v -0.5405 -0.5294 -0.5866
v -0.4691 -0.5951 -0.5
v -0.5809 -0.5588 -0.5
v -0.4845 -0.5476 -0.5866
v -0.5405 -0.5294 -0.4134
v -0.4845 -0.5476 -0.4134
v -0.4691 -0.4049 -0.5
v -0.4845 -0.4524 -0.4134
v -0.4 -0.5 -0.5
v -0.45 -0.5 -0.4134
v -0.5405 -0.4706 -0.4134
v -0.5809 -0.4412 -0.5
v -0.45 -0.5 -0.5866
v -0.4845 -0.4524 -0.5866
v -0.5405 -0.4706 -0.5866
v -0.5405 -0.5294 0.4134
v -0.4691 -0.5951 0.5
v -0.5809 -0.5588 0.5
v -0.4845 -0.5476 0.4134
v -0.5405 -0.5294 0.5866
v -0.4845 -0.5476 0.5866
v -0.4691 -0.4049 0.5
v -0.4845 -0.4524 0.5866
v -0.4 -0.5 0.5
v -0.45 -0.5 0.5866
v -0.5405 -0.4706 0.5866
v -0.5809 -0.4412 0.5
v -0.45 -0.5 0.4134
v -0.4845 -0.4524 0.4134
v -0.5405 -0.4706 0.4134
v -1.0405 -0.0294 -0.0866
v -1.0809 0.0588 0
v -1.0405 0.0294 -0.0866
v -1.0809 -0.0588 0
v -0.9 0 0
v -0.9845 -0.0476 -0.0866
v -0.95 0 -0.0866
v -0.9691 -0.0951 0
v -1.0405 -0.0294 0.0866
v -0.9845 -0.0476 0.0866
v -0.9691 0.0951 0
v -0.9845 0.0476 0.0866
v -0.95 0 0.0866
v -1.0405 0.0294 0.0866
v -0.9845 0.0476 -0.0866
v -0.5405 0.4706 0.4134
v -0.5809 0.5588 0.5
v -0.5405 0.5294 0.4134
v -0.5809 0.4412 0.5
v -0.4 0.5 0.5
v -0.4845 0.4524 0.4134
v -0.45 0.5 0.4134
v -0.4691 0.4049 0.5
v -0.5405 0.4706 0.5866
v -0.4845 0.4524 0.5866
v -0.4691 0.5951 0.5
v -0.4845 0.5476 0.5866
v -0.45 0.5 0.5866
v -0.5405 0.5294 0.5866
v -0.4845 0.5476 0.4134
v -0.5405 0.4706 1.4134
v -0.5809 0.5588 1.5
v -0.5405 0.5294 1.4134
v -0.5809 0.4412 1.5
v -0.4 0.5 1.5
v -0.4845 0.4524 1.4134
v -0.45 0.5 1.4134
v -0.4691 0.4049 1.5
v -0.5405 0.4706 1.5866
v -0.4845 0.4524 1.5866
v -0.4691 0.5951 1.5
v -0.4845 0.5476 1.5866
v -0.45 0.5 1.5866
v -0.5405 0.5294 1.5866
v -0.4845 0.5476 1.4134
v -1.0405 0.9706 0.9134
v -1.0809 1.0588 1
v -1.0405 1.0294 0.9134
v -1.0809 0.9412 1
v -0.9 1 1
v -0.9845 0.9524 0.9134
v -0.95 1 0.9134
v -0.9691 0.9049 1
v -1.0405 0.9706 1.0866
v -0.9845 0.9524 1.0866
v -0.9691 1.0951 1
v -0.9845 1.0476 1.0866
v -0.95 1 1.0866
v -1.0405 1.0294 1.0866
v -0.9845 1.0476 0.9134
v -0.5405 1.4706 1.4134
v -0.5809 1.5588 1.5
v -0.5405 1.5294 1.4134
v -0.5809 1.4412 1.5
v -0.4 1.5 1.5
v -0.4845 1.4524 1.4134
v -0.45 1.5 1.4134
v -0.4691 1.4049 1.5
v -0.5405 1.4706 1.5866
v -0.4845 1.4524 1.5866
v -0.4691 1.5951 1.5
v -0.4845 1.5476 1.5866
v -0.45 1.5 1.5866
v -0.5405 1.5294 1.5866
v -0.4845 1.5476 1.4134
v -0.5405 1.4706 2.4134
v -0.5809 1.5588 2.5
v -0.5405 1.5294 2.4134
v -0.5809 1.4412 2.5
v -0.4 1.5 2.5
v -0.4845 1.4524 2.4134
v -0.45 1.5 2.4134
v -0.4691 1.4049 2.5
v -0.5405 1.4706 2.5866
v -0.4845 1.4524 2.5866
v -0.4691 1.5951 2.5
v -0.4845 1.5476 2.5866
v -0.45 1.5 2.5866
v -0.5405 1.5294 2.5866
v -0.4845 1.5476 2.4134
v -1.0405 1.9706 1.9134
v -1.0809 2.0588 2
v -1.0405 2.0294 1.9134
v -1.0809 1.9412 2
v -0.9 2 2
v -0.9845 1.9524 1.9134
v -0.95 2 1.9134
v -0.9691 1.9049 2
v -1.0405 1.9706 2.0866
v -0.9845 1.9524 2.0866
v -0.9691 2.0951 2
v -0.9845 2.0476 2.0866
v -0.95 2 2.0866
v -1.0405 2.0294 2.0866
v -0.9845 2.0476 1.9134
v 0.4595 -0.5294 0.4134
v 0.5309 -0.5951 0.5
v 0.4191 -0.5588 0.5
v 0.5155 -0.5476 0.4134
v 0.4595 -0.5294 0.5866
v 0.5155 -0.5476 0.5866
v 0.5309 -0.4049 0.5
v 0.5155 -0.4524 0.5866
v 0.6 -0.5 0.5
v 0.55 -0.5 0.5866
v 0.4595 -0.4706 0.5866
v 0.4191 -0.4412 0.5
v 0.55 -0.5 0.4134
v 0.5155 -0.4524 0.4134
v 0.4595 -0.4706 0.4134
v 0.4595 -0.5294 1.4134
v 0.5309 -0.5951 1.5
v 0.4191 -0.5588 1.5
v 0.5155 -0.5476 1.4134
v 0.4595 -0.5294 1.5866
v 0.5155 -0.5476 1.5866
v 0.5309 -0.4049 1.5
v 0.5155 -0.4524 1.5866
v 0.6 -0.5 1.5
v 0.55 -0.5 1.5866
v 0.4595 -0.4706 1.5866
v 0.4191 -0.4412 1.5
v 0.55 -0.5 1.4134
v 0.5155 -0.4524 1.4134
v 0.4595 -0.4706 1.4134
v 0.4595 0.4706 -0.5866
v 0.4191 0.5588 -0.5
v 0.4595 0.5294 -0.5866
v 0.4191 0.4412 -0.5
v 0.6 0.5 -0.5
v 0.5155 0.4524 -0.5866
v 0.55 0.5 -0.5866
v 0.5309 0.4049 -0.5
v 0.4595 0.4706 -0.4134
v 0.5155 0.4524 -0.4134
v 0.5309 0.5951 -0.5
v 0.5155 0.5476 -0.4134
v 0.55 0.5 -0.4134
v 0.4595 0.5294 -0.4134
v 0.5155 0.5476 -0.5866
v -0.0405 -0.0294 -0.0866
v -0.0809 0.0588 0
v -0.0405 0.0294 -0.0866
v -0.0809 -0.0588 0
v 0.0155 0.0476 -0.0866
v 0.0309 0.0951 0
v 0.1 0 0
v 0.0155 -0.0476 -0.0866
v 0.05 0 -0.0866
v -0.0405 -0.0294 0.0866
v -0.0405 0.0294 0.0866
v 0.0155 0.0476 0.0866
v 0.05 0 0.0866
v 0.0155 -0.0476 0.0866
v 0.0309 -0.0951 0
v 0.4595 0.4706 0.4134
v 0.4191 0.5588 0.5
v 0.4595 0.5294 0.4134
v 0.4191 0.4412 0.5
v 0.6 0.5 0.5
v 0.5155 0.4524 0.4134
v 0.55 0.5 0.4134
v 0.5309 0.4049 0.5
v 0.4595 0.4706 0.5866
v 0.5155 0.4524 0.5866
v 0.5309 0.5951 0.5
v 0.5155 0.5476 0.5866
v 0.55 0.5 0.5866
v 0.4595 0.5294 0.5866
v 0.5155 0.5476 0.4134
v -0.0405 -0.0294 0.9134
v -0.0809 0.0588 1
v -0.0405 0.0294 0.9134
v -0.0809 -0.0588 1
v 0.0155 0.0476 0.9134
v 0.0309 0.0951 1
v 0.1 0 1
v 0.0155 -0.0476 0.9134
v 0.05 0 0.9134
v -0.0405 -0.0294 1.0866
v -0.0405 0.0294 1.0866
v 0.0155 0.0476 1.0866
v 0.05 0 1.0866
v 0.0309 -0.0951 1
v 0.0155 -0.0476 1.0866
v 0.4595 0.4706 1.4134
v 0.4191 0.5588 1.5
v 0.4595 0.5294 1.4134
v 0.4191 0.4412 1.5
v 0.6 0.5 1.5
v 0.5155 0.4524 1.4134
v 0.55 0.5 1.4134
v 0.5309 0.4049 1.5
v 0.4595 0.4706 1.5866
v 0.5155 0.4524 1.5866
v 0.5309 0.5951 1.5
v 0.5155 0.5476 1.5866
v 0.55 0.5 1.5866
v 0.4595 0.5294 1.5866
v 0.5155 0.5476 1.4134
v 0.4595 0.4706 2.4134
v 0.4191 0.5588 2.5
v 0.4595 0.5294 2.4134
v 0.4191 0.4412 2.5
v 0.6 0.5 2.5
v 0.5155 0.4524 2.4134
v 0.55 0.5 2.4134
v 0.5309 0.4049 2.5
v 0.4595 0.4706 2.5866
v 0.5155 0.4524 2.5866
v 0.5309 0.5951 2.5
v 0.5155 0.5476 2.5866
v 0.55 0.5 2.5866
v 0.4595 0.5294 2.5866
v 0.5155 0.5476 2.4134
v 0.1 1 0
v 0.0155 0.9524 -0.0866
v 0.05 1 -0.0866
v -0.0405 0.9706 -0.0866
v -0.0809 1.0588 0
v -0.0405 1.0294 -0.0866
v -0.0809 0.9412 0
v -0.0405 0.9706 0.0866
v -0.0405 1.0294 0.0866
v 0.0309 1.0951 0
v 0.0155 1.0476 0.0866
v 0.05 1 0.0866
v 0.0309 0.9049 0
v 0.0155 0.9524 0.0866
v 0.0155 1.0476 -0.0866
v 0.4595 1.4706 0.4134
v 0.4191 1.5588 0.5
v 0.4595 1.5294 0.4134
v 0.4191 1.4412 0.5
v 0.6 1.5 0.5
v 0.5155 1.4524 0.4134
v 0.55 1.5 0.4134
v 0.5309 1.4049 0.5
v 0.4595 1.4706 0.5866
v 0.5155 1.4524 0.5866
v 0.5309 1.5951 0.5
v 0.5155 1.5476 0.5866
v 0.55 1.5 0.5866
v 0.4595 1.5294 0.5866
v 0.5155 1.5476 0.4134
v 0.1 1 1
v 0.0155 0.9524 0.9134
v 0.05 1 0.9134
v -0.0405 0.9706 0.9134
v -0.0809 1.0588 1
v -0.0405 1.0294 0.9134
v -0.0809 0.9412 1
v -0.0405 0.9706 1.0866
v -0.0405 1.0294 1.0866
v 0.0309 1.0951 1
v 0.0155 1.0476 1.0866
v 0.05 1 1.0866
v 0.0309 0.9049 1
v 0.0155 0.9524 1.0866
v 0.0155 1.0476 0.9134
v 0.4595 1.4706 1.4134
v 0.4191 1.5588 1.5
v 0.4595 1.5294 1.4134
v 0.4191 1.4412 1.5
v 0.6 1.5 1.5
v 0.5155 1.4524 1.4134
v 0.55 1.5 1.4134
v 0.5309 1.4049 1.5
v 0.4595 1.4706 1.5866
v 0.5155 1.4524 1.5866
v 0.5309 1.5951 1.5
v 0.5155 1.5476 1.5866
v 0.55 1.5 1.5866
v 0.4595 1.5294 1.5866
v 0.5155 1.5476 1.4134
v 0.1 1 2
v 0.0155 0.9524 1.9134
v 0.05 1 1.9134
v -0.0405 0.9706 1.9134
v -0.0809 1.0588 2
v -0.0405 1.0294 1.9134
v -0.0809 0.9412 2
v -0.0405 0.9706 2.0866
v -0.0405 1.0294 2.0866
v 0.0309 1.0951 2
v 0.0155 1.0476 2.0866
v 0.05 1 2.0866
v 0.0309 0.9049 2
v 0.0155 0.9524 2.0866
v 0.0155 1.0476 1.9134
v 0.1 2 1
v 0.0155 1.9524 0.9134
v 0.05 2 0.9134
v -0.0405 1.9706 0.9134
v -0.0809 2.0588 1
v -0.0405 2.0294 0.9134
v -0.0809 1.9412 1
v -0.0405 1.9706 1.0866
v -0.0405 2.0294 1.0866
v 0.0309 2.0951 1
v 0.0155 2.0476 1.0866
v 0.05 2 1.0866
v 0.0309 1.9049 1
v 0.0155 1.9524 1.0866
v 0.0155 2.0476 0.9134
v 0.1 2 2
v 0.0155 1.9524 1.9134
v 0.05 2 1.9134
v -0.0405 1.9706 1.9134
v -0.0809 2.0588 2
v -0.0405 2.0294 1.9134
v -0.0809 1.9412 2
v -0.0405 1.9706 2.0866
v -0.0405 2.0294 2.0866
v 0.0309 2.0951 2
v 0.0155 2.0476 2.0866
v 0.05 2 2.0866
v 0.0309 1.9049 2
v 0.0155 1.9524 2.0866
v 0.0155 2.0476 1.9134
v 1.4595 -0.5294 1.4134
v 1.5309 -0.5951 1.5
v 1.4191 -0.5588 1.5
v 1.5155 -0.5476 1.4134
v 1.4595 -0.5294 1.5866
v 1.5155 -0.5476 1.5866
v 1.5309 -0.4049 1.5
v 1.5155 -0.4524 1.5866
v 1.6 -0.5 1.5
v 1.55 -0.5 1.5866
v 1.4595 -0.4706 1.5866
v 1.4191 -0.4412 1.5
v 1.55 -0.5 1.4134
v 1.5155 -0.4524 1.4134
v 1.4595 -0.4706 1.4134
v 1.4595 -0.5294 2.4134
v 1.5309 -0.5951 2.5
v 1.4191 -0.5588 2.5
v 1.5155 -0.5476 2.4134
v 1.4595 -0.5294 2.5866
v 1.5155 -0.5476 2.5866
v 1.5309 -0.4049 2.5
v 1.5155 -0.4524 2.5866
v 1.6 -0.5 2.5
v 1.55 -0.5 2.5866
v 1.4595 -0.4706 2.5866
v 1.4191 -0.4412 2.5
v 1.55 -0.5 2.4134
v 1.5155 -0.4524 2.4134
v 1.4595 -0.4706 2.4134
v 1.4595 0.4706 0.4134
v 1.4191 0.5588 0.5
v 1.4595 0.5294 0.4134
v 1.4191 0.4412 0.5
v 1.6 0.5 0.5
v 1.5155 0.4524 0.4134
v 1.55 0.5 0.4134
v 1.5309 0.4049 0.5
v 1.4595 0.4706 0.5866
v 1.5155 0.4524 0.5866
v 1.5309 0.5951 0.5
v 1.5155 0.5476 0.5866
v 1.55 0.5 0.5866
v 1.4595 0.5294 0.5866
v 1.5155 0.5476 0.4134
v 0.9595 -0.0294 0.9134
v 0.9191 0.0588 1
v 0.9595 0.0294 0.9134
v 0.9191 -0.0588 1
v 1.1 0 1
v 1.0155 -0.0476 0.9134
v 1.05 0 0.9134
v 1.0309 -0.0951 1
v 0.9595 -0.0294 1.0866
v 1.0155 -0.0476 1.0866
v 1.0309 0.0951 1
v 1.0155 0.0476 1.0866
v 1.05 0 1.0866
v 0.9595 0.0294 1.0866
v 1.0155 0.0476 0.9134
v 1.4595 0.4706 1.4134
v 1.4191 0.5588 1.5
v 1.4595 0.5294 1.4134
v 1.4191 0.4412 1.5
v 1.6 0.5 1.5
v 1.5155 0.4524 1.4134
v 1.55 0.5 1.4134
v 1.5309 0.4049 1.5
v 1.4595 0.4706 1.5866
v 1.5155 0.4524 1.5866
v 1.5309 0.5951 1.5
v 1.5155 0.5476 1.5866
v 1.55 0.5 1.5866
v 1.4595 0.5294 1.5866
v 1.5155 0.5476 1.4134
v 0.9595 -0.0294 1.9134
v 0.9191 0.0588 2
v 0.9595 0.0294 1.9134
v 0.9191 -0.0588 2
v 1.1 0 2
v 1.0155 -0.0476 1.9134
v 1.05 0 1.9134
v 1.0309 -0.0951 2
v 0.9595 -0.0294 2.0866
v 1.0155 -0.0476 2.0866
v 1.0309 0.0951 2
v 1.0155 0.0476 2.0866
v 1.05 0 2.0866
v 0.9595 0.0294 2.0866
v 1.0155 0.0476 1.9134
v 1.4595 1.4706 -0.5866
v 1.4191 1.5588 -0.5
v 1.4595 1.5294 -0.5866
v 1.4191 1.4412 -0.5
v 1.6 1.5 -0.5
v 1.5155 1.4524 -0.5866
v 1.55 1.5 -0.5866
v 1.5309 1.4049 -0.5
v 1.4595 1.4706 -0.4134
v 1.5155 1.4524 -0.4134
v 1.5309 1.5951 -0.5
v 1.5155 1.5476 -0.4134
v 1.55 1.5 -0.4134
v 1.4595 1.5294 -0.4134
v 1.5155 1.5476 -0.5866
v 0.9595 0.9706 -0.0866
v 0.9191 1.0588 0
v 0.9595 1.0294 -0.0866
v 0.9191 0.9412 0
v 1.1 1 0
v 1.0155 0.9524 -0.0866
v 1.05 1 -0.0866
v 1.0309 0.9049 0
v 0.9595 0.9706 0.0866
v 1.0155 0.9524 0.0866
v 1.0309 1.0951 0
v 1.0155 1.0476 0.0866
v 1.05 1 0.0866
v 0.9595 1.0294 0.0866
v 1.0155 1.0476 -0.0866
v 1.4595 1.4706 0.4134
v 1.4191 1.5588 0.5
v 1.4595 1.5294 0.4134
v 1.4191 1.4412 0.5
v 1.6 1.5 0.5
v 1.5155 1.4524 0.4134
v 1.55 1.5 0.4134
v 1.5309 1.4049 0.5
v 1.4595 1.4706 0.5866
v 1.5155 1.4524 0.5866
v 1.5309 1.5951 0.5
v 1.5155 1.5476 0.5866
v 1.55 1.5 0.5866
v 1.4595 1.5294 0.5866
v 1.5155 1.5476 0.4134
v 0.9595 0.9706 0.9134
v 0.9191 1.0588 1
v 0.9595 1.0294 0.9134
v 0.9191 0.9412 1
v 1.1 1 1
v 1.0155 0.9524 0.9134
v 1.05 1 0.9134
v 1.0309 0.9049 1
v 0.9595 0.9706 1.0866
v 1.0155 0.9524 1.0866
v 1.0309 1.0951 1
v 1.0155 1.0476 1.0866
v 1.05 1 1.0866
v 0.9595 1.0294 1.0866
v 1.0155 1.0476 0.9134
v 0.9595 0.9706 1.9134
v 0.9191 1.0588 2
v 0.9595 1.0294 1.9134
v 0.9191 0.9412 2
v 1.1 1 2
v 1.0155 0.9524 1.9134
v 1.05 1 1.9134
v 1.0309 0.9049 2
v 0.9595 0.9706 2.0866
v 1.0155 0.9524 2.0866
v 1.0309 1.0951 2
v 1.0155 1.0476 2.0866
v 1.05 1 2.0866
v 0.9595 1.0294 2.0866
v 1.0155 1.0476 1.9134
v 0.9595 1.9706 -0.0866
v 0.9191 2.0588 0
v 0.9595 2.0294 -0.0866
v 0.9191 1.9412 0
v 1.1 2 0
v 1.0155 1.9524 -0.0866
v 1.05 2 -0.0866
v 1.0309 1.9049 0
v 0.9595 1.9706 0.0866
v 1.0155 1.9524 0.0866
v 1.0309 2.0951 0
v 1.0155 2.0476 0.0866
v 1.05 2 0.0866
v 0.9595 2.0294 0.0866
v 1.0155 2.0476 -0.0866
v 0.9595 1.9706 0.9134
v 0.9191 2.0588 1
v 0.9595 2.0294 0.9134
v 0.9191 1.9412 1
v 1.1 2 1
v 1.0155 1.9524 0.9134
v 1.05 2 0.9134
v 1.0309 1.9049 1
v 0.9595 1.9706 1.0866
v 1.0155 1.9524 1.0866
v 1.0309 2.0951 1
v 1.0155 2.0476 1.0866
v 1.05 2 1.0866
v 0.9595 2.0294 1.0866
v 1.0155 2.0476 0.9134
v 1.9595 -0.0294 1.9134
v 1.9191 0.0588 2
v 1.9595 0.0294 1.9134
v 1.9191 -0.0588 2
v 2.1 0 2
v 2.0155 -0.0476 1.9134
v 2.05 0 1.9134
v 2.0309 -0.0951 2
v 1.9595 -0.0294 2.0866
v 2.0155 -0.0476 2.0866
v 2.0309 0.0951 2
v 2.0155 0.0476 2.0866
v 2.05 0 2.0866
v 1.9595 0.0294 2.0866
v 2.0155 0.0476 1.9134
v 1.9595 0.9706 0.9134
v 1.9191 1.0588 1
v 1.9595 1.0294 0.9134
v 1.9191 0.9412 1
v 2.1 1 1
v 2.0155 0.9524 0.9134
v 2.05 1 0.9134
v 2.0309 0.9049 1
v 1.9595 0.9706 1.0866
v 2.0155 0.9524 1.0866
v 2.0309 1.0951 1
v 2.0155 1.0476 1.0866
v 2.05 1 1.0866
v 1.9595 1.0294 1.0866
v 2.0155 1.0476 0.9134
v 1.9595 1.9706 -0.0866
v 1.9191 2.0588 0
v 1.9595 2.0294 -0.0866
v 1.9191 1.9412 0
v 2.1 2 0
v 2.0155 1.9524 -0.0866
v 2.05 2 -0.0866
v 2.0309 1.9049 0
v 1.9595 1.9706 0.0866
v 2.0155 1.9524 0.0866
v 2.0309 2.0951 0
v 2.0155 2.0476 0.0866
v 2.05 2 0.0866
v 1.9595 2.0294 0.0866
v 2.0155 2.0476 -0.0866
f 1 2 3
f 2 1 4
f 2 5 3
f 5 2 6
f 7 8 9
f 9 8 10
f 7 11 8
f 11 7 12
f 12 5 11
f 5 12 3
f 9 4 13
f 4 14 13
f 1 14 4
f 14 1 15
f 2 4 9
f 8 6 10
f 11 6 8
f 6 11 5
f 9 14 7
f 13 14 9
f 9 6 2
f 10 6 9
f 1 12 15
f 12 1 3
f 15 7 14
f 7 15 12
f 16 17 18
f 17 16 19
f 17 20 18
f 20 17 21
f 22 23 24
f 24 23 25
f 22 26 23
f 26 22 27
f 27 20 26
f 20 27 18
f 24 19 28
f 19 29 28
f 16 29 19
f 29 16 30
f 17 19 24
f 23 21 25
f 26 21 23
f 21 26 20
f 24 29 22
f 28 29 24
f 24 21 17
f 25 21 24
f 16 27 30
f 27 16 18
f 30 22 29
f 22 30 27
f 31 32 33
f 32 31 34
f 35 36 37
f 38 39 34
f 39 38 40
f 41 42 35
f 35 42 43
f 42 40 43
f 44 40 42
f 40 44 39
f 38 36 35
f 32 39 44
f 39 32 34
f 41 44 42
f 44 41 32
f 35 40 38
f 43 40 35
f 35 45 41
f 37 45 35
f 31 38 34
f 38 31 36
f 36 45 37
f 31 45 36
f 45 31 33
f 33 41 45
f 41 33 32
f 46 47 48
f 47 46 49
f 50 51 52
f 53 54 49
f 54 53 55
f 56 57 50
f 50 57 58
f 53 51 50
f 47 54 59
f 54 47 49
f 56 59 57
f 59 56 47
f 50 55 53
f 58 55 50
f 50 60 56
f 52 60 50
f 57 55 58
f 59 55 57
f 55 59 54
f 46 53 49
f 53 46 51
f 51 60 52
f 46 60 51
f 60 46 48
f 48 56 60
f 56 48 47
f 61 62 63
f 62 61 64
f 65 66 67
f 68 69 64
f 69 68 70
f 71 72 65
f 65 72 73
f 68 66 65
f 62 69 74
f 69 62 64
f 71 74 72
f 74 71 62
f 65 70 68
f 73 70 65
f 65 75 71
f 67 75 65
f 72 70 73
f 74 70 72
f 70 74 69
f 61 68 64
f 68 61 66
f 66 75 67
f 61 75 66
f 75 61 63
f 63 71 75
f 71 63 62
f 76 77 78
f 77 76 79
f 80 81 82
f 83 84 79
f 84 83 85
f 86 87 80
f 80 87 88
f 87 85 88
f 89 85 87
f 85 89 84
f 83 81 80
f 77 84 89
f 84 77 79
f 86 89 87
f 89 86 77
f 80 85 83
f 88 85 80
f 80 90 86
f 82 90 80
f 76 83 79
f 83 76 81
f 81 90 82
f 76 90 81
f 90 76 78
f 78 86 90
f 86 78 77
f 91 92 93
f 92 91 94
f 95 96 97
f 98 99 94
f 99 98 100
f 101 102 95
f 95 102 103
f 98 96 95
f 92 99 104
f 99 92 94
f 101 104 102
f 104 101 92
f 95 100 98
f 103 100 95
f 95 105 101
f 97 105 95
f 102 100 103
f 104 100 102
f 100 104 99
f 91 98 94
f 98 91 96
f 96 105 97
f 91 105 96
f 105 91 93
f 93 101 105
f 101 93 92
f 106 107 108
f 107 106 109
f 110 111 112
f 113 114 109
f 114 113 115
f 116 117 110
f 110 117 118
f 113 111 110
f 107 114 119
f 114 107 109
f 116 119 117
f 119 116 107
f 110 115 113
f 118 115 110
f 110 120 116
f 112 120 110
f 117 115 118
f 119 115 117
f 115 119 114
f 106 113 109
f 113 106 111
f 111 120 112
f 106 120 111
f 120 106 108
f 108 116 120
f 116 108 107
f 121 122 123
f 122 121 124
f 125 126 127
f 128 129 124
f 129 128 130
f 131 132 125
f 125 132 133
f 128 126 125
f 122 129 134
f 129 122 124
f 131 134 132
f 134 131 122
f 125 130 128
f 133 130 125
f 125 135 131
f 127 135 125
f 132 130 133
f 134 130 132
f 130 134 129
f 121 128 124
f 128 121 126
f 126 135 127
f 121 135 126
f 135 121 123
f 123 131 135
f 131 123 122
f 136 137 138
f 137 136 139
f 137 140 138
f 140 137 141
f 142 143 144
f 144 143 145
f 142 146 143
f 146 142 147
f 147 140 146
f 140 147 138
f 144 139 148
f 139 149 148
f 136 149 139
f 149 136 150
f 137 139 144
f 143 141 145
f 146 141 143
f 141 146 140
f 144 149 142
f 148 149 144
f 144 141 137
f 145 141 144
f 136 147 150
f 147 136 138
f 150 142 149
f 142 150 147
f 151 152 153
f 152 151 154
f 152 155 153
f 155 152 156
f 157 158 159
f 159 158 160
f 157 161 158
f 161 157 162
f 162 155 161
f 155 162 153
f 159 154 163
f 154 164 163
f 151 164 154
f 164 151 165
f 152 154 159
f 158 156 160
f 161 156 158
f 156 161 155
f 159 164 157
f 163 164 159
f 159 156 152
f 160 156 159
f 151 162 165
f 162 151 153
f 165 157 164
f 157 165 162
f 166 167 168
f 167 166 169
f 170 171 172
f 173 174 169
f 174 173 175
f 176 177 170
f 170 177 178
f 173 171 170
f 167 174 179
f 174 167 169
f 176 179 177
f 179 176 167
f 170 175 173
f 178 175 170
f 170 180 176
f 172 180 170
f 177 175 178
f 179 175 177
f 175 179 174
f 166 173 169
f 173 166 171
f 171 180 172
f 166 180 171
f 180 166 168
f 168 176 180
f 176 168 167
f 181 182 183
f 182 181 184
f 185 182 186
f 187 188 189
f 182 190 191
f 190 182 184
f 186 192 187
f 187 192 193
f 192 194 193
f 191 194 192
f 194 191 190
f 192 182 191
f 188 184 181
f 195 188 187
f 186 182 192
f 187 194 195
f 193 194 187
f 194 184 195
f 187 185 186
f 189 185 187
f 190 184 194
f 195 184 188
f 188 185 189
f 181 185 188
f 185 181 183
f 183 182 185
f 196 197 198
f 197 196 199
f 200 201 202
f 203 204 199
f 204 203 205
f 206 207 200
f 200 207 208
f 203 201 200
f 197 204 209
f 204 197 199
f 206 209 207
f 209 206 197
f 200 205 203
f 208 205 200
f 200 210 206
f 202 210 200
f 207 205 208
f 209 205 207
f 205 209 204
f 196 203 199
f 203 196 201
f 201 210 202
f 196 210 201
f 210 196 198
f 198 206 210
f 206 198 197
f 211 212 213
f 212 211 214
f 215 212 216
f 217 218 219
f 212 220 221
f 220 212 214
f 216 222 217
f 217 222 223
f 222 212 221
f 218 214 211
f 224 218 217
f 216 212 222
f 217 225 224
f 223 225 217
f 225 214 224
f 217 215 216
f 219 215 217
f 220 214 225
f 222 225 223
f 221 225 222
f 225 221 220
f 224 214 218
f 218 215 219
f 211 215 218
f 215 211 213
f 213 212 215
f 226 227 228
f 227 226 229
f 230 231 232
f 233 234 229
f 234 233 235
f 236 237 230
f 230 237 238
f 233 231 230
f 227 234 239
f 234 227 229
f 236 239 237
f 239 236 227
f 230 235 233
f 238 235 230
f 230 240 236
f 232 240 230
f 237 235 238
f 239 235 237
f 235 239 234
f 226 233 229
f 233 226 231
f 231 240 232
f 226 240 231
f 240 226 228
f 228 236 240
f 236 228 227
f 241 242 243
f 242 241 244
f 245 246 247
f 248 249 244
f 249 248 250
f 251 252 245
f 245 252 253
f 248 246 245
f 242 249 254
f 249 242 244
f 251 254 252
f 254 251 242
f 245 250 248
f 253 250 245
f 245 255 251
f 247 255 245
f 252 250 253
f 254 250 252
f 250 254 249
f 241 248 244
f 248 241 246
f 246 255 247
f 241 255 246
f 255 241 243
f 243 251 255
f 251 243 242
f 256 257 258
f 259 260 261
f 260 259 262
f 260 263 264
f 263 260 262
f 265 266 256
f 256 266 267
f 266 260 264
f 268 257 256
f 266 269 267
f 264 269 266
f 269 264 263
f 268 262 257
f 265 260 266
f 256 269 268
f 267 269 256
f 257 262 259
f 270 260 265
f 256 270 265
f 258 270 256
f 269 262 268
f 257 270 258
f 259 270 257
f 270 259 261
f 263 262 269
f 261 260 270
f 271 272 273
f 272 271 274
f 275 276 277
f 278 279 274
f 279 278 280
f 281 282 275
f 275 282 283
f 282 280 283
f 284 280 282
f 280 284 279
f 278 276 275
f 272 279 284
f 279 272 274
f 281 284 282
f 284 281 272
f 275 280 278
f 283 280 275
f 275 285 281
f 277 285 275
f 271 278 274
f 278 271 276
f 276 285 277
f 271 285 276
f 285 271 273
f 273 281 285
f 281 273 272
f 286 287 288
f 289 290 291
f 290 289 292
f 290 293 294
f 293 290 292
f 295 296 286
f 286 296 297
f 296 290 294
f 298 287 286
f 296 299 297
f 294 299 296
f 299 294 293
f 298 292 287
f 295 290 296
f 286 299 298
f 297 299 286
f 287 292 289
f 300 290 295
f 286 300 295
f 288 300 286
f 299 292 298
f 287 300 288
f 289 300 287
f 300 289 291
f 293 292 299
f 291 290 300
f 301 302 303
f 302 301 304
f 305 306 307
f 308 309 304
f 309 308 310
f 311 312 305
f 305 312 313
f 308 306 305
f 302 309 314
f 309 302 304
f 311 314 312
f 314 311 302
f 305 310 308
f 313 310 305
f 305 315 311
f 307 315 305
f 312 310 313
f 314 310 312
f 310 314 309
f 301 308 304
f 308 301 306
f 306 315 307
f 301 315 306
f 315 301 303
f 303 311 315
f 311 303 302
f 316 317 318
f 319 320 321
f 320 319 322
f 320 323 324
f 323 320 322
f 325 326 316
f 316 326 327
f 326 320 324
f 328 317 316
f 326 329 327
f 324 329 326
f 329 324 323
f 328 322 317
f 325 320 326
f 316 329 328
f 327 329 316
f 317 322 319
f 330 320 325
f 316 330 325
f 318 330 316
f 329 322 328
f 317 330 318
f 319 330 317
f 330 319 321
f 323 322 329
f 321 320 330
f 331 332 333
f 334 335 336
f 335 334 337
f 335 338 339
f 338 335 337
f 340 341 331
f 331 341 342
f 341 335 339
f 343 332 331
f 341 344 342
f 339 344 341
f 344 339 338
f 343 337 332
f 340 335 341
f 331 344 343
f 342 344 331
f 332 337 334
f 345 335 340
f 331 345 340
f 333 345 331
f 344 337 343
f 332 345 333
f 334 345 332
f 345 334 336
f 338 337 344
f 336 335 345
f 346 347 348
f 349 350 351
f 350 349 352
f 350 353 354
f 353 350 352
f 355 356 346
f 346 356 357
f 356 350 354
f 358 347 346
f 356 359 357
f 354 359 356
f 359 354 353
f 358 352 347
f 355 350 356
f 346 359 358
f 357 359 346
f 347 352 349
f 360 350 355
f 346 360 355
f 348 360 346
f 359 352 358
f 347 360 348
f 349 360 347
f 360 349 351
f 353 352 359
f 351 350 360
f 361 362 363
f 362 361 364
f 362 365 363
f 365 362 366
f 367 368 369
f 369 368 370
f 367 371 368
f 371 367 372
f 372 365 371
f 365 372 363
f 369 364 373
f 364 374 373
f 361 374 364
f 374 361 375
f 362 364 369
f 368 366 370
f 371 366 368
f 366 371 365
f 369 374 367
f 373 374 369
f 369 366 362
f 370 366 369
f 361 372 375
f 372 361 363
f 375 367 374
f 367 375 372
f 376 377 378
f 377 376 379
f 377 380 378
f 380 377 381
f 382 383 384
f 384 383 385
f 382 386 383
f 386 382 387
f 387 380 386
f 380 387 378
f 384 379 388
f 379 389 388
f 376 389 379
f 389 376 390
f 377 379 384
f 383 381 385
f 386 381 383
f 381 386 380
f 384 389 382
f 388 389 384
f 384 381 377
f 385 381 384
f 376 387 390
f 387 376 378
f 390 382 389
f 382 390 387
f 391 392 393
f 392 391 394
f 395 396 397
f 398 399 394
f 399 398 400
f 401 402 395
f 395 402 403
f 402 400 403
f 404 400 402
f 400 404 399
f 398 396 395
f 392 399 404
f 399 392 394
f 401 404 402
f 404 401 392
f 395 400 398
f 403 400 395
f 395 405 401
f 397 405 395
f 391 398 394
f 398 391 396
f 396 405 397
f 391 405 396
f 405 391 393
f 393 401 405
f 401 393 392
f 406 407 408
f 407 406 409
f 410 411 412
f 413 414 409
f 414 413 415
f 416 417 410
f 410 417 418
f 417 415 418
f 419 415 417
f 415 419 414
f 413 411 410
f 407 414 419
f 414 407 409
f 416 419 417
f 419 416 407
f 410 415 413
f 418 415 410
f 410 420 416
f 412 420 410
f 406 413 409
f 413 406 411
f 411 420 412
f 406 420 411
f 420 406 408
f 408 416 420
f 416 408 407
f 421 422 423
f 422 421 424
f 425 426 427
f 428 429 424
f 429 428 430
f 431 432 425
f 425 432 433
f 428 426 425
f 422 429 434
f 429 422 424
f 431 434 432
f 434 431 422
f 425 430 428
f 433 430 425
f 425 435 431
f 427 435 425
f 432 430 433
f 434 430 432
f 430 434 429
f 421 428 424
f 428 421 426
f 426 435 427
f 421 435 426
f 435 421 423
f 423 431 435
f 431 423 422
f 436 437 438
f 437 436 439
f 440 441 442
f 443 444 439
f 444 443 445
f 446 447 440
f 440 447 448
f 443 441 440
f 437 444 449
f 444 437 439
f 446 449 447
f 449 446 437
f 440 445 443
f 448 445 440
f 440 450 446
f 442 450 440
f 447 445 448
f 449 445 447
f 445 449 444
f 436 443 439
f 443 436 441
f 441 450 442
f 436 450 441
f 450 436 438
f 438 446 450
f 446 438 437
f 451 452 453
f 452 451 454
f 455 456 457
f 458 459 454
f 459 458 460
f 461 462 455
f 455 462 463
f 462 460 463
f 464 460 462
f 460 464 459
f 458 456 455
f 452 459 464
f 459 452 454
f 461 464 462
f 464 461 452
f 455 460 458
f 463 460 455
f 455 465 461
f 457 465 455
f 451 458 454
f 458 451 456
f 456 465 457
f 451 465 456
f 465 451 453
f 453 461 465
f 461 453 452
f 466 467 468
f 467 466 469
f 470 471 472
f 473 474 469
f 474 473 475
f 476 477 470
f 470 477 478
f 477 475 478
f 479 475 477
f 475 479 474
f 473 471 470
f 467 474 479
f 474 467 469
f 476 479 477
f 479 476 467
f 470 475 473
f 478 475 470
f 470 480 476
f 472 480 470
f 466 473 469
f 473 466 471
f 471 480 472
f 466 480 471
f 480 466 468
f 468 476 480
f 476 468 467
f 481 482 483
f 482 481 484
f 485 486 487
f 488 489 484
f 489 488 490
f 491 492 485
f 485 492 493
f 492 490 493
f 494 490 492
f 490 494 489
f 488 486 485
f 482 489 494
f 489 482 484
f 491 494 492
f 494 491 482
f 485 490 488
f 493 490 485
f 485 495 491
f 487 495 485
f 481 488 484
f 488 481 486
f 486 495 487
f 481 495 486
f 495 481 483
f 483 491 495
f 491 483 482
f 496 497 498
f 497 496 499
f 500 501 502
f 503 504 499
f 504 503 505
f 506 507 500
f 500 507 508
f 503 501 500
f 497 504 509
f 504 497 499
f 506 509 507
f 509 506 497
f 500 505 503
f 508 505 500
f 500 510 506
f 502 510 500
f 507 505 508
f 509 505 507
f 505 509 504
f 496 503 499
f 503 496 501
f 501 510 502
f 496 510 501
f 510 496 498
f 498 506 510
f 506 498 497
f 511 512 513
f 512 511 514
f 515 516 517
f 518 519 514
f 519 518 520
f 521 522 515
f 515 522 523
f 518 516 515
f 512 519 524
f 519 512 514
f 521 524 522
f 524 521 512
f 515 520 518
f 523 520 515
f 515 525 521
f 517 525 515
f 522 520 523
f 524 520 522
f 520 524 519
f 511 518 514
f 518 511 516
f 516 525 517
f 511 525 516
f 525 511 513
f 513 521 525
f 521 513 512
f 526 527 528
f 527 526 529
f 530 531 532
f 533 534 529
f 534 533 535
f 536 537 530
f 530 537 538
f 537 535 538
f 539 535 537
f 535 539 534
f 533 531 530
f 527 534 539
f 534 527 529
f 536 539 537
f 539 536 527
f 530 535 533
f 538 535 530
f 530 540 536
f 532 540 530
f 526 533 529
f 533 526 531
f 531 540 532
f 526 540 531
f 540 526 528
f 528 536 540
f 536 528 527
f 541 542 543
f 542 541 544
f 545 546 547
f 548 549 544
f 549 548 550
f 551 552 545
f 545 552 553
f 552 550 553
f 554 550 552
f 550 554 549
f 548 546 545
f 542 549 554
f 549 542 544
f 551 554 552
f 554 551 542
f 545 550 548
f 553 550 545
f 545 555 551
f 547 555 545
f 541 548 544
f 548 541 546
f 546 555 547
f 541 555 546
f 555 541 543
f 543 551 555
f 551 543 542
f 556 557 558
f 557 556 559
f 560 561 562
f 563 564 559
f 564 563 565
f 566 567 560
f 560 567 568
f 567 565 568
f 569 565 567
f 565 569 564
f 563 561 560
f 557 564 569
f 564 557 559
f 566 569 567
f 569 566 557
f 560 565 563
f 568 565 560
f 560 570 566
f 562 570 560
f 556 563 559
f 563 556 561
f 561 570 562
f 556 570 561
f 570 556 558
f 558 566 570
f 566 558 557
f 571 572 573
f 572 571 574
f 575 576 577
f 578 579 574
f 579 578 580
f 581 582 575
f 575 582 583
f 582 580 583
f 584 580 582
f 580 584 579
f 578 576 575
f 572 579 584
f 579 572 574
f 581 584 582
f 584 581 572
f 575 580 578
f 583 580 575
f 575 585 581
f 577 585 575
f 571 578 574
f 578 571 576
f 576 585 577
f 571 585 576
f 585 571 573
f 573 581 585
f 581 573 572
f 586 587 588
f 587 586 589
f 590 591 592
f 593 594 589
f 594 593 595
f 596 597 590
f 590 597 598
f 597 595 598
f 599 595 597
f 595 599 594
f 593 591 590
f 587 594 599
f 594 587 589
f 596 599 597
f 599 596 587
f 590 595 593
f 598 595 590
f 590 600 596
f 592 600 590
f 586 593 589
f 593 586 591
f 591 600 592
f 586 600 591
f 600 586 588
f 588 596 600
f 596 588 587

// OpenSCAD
// file: lattice.scad
// Centered cubic grid, as presented in Equation (18) from arXiv:1311.0879


//  Uncut centered cubic grid.
module maille(nb) {
    // Diameter of small balls
    rad = 0.1;
    for (x = [0:nb]) {
        for (y = [0:nb]) {
            for (z = [0:nb]) {
                type = abs((x + y + z) % 2);  // Correspond to color
                x2 = x+0.5; y2 = y+0.5; z2 = z+0.5;
                if (type == 0) {
                        color("red") translate([x, y, z]) sphere(rad);
                        color("blue") translate([x2, y2, z2]) sphere(rad);
                        }
                if (type == 1) {
                    color("green") translate([x, y, z]) sphere(rad);
                    color("yellow") translate([x2, y2, z2]) sphere(rad);
                    }
                }
            }
        }
    }



// Check Equation (19) of arXiv:1311.0879 (n stars at 1).
function filtre(x, y, z, n) = ((x+y+z <= 0 + 2*(n-1))
                               && (x-y-z <= 1/2)
                               && (-x+y-z <= 1)
                               && (-x-y+z <= 3/2)) ? true : false;


// Grid as presented in Equations (18) and (19) of arXiv:1311.0879.
// n : number n in Equation (19): index in the code family, starts at 1.
module grille(n) {
    // Diameter of small balls
    rad = 0.1;
    for (x = [-1:n-1]) {
        for (y = [-1:n-1]) {
            for (z = [-1:n-1]) {
                type = abs((x + y + z) % 2);  // Correspond to color
                if (filtre(x, y, z, n)) {
                    if (type == 0) {
                        color("red") translate([x, y, z]) sphere(rad);
                        }
                    if (type == 1) {
                        color("green") translate([x, y, z]) sphere(rad);
                        }
                    }
                x2 = x+0.5; y2 = y+0.5; z2 = z+0.5;
                if (filtre(x2, y2, z2, n)) {
                    if (type == 0) {
                        color("blue") translate([x2, y2, z2]) sphere(rad);
                        }
                    if (type == 1) {
                        color("yellow") translate([x2, y2, z2]) sphere(rad);
                        }
                    }
                }
            }
        }
    }

//maille(2);
grille(2);
// main file
use <lattice.scad>;

// Check if a vertex is adjacent to the central layer (that sets the size of processor).
// n as n_code in article (starts at 1).
function central_layer(x, y, z, n) = ((x+z == n-2) || (x+z == n-1)) ? true : false;

// Elementary tetrahedron as described in Equation (18) of arXiv:1311.0879.
// x, y, z : coordinates of vector x in arXiv:1311.0879
// s : +- 1
// permut : integer between 0 and 5 (included) that describe the permutation (a, b, c) :
//          0 : (a, b, c) = (i, j, k)
//          1 : (a, b, c) = (i, k, j)
//          2 : (a, b, c) = (j, i, k)
//          3 : (a, b, c) = (j, k, i)
//          4 : (a, b, c) = (k, i, j)
//          5 : (a, b, c) = (k, j, i)
// n : we keep only tetrahedron included in the code structure indexed by n.
//     n is as in Equation (19) of arXiv:1311.0879 (starts at 1).
//     use -1 for no filter
 module tetraedre (x, y, z, s, permut, n) {
     // if (permut==0) {xa=1; ya=0; za=0; xb=0; yb=1; zb=0; xc=0; yc=0; zc=1;}
     // if (permut==1) {xa=1; ya=0; za=0; xb=0; yb=0; zb=1; xc=0; yc=1; zc=0;}
     // if (permut==2) {xa=0; ya=1; za=0; xb=1; yb=0; zb=0; xc=0; yc=0; zc=1;}
     // if (permut==3) {xa=0; ya=1; za=0; xb=0; yb=0; zb=1; xc=1; yc=0; zc=0;}
     // if (permut==4) {xa=0; ya=0; za=1; xb=1; yb=0; zb=0; xc=0; yc=1; zc=0;}
     // if (permut==5) {xa=0; ya=0; za=1; xb=0; yb=1; zb=0; xc=1; yc=0; zc=0;}
     xa = permut==0 || permut==1 ? 1 : 0;
     ya = permut==2 || permut==3 ? 1 : 0;
     za = permut==4 || permut==5 ? 1 : 0;
     xb = permut==2 || permut==4 ? 1 : 0;
     yb = permut==0 || permut==5 ? 1 : 0;
     zb = permut==1 || permut==3 ? 1 : 0;
     xc = permut==3 || permut==5 ? 1 : 0;
     yc = permut==1 || permut==4 ? 1 : 0;
     zc = permut==0 || permut==2 ? 1 : 0;

     // Coordinates of vertices of the tetrahedron.
     x1=x; y1=y; z1=z;                                               // x
     x2=x+xa; y2=y+ya; z2=z+za;                                      // x + a
     x3=x+(xa+s*xb+xc)/2; y3=y+(ya+s*yb+yc)/2; z3=z+(za+s*zb+zc)/2;  // x + (a+sb+c)/2
     x4=x+(xa+s*xb-xc)/2; y4=y+(ya+s*yb-yc)/2; z4=z+(za+s*zb-zc)/2;  // x + (a+sb-c)/2

     if (n == -1 || (
         filtre(x1, y1, z1, n)
         && filtre(x2, y2, z2, n)
         && filtre(x3, y3, z3, n)
         && filtre(x4, y4, z4, n)
     )) {
         // echo(x, y, z, s, permut, n);
         if (central_layer(x1, y1, z1, n)
             && central_layer(x2, y2, z2, n)
             && central_layer(x3, y3, z3, n)
             && central_layer(x4, y4, z4, n))
            {
             echo("One central tetraedron");  // For counting
             color("red")
             polyhedron(
                 points=[[x1,y1,z1], [x2,y2,z2], [x3,y3,z3], [x4,y4,z4]],
                 faces=[[0,1,2], [0,1,3], [0,2,3], [1,3,2]]
                );
            }
         else {
             polyhedron(
                 points=[[x1,y1,z1], [x2,y2,z2], [x3,y3,z3], [x4,y4,z4]],
                 faces=[[0,1,2], [0,1,3], [0,2,3], [1,3,2]]
                );
            }
        }
    }


n = 3;
grille(n);

for (x = [-1:n-1]) {
        for (y = [-1:n-1]) {
            for (z = [-1:n-1]) {
                for (s=[-1:2:1]) {
                    for (permut = [0:5]) {
                        tetraedre(x, y, z, s, permut, n);
                    }
                }
            }
        }
    }
